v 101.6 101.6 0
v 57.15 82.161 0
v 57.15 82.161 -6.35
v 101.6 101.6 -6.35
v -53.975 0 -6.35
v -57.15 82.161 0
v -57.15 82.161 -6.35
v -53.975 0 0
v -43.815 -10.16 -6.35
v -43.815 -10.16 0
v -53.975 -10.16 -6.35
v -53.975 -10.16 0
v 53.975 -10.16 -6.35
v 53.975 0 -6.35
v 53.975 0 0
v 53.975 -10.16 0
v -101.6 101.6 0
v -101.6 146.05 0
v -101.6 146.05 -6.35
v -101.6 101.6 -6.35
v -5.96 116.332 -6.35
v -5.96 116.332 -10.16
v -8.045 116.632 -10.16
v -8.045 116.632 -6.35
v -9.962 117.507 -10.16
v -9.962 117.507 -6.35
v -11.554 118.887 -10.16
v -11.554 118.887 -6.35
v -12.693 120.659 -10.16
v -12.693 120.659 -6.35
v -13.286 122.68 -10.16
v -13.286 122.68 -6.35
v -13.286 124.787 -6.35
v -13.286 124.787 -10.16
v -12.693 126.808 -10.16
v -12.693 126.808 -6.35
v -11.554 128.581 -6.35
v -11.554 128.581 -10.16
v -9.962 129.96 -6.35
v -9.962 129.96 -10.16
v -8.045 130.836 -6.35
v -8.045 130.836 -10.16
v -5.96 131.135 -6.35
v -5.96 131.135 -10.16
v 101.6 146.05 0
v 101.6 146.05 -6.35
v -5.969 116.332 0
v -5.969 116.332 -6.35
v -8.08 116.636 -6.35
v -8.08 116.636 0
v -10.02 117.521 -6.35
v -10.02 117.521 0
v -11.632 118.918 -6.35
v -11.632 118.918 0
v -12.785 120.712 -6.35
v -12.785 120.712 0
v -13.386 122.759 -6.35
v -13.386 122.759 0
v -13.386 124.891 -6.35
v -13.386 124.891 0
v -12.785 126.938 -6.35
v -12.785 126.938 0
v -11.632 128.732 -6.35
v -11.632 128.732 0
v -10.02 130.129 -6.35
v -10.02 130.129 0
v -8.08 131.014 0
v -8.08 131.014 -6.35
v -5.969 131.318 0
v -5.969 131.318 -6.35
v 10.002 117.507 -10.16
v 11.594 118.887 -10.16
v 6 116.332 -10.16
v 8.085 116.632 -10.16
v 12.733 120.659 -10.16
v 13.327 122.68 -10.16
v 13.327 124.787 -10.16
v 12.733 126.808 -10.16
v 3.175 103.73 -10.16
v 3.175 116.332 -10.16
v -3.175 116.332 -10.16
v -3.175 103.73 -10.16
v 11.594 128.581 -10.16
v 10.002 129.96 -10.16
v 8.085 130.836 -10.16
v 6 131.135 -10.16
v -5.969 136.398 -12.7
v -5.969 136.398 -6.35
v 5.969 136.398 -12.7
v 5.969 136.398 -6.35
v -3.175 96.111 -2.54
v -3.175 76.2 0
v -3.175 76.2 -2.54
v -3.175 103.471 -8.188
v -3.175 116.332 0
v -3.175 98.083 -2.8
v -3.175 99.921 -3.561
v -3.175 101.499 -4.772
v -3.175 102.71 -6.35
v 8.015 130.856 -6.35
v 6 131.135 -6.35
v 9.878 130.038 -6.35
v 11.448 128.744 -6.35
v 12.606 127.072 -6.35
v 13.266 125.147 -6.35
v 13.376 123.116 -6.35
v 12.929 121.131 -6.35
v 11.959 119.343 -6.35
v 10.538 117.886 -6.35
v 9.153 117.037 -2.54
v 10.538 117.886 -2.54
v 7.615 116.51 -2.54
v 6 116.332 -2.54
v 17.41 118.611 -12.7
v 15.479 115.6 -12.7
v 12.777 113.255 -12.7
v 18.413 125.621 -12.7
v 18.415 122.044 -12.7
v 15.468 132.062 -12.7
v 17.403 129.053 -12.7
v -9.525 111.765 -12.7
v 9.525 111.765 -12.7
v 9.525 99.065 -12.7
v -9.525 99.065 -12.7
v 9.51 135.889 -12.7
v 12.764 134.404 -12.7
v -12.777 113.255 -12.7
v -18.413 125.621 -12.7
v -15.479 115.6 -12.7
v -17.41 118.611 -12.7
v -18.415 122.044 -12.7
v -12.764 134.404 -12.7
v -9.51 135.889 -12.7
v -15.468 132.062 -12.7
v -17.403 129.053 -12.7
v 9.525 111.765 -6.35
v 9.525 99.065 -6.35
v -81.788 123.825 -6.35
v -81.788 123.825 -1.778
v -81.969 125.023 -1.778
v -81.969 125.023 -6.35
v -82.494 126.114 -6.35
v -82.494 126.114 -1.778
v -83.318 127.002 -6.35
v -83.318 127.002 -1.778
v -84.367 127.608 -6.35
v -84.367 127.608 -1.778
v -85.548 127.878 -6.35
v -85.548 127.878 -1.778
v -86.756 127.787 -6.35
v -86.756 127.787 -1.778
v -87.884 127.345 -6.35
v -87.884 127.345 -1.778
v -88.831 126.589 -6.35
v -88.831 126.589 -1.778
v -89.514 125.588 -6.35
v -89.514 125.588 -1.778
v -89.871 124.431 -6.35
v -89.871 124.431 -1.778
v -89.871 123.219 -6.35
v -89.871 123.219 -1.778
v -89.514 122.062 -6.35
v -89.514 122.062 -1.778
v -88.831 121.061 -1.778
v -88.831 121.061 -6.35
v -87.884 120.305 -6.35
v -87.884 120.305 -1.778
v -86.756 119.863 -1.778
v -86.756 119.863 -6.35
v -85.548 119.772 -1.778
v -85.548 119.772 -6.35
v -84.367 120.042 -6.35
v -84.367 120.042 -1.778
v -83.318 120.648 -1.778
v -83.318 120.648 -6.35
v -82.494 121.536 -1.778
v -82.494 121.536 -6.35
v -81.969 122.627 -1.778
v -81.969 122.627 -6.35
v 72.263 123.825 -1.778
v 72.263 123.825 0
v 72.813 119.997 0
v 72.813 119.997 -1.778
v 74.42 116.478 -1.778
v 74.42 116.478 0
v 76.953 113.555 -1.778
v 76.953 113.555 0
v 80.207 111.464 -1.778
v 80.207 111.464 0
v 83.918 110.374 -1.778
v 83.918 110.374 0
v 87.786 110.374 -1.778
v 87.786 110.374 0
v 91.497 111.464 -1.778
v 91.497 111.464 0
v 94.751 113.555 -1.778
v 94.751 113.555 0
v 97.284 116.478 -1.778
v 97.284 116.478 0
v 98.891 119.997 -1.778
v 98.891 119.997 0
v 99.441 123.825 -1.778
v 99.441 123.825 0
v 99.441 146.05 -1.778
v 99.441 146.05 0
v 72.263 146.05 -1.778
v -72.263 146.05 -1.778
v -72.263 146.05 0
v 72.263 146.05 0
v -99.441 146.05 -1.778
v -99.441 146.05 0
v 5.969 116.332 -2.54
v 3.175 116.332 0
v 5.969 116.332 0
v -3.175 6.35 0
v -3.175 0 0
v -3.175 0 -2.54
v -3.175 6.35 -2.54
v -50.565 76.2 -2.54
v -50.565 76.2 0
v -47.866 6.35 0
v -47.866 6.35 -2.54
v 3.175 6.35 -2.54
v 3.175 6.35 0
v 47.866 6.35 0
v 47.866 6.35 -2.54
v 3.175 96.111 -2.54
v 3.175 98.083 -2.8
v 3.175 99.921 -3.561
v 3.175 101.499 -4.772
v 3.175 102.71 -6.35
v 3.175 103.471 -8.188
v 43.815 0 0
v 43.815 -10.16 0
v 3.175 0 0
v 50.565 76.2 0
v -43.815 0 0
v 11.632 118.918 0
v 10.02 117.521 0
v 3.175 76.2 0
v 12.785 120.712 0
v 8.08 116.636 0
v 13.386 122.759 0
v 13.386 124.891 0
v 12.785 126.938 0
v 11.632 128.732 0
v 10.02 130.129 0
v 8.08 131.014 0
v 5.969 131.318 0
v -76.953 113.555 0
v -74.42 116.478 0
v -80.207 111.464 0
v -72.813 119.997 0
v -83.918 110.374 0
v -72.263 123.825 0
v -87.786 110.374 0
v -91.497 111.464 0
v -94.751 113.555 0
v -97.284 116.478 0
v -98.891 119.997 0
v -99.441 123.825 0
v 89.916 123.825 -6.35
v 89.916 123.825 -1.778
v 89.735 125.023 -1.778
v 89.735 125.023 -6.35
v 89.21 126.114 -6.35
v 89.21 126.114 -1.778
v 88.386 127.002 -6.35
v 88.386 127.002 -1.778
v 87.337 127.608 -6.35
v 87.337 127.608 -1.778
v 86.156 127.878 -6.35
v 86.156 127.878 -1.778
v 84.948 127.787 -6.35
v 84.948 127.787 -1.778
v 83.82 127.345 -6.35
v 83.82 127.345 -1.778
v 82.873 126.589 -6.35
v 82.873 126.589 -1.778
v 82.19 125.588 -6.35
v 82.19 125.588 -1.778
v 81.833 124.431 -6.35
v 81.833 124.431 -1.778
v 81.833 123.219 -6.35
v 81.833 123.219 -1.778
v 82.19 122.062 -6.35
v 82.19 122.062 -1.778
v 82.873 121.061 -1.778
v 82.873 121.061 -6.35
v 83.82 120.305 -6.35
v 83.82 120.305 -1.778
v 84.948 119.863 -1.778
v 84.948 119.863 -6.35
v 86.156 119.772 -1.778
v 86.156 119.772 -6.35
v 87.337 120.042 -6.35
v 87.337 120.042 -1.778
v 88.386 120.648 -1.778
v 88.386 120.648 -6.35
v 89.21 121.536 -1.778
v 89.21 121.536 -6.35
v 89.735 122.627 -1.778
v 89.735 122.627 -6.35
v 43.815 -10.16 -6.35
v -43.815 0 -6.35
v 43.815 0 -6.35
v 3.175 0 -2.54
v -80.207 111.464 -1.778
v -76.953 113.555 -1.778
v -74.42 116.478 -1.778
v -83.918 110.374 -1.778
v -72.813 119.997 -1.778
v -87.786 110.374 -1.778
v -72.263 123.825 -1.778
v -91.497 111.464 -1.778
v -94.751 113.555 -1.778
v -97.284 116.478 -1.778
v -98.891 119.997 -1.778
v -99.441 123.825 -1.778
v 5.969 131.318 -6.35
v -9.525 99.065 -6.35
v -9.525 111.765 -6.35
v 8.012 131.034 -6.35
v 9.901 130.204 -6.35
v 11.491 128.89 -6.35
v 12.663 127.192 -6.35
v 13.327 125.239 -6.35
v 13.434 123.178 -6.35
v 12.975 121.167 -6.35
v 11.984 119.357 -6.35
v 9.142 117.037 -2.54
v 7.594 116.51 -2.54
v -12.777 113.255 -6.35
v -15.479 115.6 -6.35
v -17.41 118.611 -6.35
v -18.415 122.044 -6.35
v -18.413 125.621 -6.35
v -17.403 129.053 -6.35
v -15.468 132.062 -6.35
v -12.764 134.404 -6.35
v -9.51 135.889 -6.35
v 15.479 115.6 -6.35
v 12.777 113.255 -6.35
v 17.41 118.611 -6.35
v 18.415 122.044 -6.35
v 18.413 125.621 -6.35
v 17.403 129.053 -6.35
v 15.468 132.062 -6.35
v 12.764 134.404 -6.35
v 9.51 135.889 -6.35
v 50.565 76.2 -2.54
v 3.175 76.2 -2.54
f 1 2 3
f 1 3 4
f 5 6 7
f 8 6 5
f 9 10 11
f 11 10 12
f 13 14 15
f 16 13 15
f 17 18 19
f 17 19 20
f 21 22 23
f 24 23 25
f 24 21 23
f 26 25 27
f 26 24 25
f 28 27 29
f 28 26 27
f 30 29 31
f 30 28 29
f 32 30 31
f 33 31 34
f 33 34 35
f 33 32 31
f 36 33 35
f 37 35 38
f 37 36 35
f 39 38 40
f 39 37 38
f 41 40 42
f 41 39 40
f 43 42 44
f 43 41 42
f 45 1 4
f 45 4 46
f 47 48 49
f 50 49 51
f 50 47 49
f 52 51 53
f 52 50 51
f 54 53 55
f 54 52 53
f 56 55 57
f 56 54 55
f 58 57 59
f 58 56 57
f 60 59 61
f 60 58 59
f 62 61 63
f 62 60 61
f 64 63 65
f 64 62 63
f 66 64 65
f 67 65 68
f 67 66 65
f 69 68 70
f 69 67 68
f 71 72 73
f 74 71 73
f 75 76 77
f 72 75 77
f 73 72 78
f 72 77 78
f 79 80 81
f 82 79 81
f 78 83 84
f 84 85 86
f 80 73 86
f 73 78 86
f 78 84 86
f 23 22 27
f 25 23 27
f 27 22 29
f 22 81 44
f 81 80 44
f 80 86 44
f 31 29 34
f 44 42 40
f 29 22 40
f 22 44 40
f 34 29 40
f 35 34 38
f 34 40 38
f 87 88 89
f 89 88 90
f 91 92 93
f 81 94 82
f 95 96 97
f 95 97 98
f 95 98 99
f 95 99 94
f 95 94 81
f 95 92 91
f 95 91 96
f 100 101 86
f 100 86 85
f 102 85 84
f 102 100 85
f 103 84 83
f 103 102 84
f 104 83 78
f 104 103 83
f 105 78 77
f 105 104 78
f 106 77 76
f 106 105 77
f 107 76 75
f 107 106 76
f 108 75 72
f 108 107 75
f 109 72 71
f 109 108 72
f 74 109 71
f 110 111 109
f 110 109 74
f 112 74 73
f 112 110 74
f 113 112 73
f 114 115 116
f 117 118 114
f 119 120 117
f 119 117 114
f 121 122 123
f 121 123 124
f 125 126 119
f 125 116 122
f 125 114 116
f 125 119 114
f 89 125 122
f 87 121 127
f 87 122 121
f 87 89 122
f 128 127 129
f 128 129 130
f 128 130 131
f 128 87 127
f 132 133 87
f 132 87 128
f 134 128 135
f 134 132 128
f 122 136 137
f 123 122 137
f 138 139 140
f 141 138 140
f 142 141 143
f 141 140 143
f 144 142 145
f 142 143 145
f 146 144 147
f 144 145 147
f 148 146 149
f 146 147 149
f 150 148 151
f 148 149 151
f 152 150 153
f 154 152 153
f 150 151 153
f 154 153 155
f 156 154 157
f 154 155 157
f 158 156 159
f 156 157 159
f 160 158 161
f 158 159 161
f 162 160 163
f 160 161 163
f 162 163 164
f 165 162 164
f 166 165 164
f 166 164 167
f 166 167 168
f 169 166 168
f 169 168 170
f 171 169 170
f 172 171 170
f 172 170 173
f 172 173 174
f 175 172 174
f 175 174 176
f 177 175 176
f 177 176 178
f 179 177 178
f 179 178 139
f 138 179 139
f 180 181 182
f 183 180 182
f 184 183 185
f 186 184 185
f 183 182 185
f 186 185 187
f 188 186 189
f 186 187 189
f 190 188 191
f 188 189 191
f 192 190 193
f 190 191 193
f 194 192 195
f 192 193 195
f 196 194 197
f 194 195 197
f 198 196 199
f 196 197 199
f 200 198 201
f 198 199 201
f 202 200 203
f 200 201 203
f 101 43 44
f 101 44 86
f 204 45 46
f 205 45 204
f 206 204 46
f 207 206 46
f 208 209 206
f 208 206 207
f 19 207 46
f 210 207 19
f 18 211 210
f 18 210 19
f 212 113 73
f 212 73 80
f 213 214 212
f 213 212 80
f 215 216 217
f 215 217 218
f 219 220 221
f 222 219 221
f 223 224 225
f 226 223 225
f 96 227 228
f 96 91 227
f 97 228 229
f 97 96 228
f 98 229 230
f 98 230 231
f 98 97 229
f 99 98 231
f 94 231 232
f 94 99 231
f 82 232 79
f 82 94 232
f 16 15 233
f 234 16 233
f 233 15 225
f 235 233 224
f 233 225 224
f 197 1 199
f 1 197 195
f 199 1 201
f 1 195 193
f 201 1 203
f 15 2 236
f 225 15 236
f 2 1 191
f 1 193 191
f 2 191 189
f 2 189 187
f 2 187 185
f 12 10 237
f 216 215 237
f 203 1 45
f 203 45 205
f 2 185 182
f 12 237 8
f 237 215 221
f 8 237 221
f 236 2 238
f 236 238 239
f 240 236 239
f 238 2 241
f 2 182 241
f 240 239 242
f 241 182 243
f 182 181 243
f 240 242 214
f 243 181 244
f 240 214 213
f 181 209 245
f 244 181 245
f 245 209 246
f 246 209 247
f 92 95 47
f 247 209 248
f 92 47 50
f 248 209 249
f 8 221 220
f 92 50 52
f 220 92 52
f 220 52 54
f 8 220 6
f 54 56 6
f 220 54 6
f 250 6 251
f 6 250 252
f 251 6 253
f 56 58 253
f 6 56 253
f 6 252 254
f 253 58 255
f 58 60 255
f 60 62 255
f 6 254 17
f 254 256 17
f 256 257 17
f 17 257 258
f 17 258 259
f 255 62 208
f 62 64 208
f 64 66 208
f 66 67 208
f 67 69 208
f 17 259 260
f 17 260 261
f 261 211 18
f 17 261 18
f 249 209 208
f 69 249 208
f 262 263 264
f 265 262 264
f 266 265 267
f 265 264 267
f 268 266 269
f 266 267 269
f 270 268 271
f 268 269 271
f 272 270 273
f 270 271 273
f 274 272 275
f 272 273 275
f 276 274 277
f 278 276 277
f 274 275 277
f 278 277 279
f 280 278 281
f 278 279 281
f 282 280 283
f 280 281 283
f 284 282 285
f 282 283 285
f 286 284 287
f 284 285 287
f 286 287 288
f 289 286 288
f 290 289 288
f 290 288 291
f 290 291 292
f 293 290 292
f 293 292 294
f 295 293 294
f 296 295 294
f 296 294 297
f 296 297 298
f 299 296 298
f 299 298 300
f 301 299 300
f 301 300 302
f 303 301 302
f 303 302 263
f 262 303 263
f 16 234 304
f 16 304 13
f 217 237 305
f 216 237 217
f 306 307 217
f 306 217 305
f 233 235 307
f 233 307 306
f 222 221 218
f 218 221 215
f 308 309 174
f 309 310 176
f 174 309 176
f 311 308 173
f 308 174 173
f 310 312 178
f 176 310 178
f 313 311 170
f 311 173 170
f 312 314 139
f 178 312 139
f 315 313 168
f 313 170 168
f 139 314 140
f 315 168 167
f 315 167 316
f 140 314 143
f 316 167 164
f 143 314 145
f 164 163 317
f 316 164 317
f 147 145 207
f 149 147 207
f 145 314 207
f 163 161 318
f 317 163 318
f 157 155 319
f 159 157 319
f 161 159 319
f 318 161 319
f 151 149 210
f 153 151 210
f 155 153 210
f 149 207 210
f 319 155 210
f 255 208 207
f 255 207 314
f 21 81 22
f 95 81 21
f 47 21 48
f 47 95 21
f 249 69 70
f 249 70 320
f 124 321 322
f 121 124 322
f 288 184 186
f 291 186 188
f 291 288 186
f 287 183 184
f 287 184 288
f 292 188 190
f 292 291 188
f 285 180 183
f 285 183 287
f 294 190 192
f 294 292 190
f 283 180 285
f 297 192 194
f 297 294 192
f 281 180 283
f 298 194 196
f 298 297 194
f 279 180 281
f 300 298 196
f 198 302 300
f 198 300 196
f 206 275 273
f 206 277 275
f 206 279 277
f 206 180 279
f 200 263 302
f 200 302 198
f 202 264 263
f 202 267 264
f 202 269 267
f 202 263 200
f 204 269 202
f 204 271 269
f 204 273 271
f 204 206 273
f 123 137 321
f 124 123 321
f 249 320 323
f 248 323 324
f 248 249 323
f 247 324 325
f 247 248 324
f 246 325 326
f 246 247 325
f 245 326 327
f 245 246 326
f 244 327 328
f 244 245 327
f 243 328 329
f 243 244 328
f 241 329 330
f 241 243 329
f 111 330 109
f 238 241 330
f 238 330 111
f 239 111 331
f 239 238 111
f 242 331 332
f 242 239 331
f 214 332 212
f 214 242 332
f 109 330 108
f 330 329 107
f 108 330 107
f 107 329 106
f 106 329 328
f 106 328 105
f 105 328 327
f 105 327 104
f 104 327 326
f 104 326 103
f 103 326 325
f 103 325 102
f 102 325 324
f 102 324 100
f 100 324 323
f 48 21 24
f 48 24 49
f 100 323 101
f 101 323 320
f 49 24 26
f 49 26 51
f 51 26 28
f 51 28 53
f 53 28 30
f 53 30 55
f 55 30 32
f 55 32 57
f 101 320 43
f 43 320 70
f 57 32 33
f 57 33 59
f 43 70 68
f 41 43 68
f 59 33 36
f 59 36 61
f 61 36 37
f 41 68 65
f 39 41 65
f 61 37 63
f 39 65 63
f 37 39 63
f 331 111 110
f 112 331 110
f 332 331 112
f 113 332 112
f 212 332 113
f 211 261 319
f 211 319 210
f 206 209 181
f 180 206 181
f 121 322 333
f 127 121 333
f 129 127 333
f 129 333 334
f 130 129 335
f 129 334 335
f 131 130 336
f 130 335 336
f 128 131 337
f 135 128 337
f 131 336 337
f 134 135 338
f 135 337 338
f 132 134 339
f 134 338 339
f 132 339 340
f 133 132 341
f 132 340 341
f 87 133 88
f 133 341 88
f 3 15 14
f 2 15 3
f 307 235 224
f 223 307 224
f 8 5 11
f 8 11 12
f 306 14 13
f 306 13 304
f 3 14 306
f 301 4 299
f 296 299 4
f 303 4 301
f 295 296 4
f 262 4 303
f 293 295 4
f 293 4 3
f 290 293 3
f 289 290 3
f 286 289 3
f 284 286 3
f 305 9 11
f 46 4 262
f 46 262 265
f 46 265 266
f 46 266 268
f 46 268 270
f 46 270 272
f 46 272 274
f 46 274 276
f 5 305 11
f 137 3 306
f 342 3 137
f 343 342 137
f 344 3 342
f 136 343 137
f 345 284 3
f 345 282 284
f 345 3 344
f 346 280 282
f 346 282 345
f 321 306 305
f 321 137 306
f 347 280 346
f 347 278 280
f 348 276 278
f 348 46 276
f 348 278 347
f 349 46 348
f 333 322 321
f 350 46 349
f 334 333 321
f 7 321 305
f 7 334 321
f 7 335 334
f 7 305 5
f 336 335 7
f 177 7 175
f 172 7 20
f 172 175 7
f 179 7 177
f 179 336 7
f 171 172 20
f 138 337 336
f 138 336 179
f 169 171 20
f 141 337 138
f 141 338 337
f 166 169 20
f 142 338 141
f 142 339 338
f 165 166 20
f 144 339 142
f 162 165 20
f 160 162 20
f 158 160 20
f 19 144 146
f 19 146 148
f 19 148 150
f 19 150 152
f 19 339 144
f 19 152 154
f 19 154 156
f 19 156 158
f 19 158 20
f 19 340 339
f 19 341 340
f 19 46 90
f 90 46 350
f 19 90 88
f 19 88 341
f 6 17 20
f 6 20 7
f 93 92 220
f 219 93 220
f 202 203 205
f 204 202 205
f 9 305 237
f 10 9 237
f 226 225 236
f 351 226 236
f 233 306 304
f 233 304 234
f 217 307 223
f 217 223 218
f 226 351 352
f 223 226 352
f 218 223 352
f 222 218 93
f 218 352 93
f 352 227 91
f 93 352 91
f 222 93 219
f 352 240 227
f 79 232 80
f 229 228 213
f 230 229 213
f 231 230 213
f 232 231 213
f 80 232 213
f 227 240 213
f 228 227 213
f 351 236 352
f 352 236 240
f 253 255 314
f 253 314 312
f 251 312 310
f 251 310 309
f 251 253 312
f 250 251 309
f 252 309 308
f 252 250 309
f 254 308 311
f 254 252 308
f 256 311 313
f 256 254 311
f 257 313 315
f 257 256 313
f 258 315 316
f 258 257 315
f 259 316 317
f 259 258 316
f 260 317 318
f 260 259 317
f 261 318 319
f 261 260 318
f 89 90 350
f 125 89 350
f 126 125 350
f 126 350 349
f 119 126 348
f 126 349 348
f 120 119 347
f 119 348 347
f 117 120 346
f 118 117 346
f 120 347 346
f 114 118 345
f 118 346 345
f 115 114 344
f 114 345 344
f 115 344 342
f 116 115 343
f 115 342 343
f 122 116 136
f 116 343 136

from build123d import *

# Parameters (mm, degrees)
MAIN_BODY_DEPTH          = 6.35
BATTERY_SPACING_DEPTH    = 2.54
SKETCH8_R                = 4.064
LIGHT_SOCKETS_DEPTH      = 12.7
LIGHT_LEADS_POCKET_DEPTH = 6.35
WIRE_TRAIL_DEPTH         = 2.54
LEAD_ROOM_DEPTH          = 7.62
FILLET1_R                = 7.62
TAB_SLOTS_DEPTH          = 1.778
SKETCH14_W               = 10.16
SKETCH14_H               = 6.35
SCREW_MOUNT_DEPTH        = 10.16


# Sheet-metal steps are written as plain solids
with BuildPart() as part:
    # Sketch1 → Main Body (new body)
    with BuildSketch(Plane.XY):
        Polygon((-53.975, 0), (53.975, 0), (57.15, 82.161327118), (101.6, 101.6), (101.6, 146.05), (-101.6, 146.05), (-101.6, 101.6), (-57.15, 82.161327118), align=None)
    extrude(amount=-MAIN_BODY_DEPTH)

    # Sketch7 → Battery Spacing (cut)
    with BuildSketch(Plane.XY):
        Polygon((-50.564894027, 76.2), (-47.86564661, 6.35), (47.86564661, 6.35), (50.564894027, 76.2), align=None)
    extrude(amount=-BATTERY_SPACING_DEPTH, mode=Mode.SUBTRACT)

    # Sketch8 → Light Sockets (cut)
    with BuildSketch(Plane.XY):
        with Locations((85.852, 123.825)):
            Circle(SKETCH8_R)
        with Locations((-85.852, 123.825)):
            Circle(SKETCH8_R)
        with BuildLine():
            Line((-5.969, 131.318), (5.969, 131.318))
            ThreePointArc((5.969, 131.318), (13.462, 123.825), (5.969, 116.332))
            Line((5.969, 116.332), (-5.969, 116.332))
            ThreePointArc((-5.969, 116.332), (-13.462, 123.825), (-5.969, 131.318))
        make_face()
    extrude(amount=-LIGHT_SOCKETS_DEPTH, mode=Mode.SUBTRACT)

    # Sketch9 → Light Leads Pocket (add)
    with BuildSketch(Plane(origin=(0, 0, -6.35), x_dir=(-1, 0, 0), z_dir=(0, 0, -1))):
        with BuildLine():
            Line((-9.525, 111.765348554), (-9.525, 99.065348554))
            Line((-9.525, 99.065348554), (9.525, 99.065348554))
            Line((9.525, 99.065348554), (9.525, 111.765348554))
            ThreePointArc((9.525, 111.765348554), (18.413001098, 125.621431375), (5.969, 136.398))
            Line((5.969, 136.398), (-5.969, 136.398))
            ThreePointArc((-5.969, 136.398), (-18.413001098, 125.621431375), (-9.525, 111.765348554))
        make_face()
    extrude(amount=LIGHT_LEADS_POCKET_DEPTH)

    # Sketch10 → Wire Trail (cut)
    with BuildSketch(Plane.XY):
        Polygon((-3.175, 116.332), (3.175, 116.332), (3.175, 76.2), (3.175, 6.35), (3.175, 0), (-3.175, 0), align=None)
    extrude(amount=-WIRE_TRAIL_DEPTH, mode=Mode.SUBTRACT)

    # Sketch12 → Lead Room (cut)
    with BuildSketch(Plane.XY.offset(-2.54)):
        with BuildLine():
            Line((-3.175, 116.332), (-5.960094489, 116.332))
            ThreePointArc((-5.960094489, 116.332), (-13.36178344, 123.73368895), (-5.960094489, 131.135377901))
            Line((-5.960094489, 131.135377901), (6.000168296, 131.135377901))
            ThreePointArc((6.000168296, 131.135377901), (13.401857247, 123.73368895), (6.000168296, 116.332))
            Line((6.000168296, 116.332), (3.175, 116.332))
            Line((3.175, 116.332), (3.175, 103.730451358))
            Line((3.175, 103.730451358), (-3.175, 103.730451358))
            Line((-3.175, 103.730451358), (-3.175, 116.332))
        make_face()
    extrude(amount=-LEAD_ROOM_DEPTH, mode=Mode.SUBTRACT)

    # Fillet1
    fillet1_edges = [part.edges().sort_by_distance(p)[0] for p in [
        (0, 103.730451358, -2.54),
    ]]
    fillet(fillet1_edges, radius=FILLET1_R - 0.0001)  # a hair under: the kernel refuses the full size

    # Sketch13 → Tab Slots (cut)
    with BuildSketch(Plane.XY):
        with BuildLine():
            Line((72.263, 146.05), (72.263, 123.825))
            ThreePointArc((72.263, 123.825), (85.852, 110.236), (99.441, 123.825))
            Line((99.441, 123.825), (99.441, 146.05))
            Line((99.441, 146.05), (72.263, 146.05))
        make_face()
    tab_slots = extrude(amount=-TAB_SLOTS_DEPTH, mode=Mode.SUBTRACT)

    # Mirror1: Tab Slots across plane
    add(tab_slots.mirror(Plane(origin=(0, 0, 0), x_dir=(0, 0, 1), z_dir=(1, 0, 0))), mode=Mode.SUBTRACT)

    # Sketch14 → Screw Mount (add)
    with BuildSketch(Plane.XZ):
        with Locations((48.895, -3.175)):
            Rectangle(SKETCH14_W, SKETCH14_H)
    screw_mount = extrude(amount=SCREW_MOUNT_DEPTH)

    # Mirror2: Screw Mount across plane
    add(screw_mount.mirror(Plane(origin=(0, 0, 0), x_dir=(0, 0, 1), z_dir=(1, 0, 0))))


solid = part.part
